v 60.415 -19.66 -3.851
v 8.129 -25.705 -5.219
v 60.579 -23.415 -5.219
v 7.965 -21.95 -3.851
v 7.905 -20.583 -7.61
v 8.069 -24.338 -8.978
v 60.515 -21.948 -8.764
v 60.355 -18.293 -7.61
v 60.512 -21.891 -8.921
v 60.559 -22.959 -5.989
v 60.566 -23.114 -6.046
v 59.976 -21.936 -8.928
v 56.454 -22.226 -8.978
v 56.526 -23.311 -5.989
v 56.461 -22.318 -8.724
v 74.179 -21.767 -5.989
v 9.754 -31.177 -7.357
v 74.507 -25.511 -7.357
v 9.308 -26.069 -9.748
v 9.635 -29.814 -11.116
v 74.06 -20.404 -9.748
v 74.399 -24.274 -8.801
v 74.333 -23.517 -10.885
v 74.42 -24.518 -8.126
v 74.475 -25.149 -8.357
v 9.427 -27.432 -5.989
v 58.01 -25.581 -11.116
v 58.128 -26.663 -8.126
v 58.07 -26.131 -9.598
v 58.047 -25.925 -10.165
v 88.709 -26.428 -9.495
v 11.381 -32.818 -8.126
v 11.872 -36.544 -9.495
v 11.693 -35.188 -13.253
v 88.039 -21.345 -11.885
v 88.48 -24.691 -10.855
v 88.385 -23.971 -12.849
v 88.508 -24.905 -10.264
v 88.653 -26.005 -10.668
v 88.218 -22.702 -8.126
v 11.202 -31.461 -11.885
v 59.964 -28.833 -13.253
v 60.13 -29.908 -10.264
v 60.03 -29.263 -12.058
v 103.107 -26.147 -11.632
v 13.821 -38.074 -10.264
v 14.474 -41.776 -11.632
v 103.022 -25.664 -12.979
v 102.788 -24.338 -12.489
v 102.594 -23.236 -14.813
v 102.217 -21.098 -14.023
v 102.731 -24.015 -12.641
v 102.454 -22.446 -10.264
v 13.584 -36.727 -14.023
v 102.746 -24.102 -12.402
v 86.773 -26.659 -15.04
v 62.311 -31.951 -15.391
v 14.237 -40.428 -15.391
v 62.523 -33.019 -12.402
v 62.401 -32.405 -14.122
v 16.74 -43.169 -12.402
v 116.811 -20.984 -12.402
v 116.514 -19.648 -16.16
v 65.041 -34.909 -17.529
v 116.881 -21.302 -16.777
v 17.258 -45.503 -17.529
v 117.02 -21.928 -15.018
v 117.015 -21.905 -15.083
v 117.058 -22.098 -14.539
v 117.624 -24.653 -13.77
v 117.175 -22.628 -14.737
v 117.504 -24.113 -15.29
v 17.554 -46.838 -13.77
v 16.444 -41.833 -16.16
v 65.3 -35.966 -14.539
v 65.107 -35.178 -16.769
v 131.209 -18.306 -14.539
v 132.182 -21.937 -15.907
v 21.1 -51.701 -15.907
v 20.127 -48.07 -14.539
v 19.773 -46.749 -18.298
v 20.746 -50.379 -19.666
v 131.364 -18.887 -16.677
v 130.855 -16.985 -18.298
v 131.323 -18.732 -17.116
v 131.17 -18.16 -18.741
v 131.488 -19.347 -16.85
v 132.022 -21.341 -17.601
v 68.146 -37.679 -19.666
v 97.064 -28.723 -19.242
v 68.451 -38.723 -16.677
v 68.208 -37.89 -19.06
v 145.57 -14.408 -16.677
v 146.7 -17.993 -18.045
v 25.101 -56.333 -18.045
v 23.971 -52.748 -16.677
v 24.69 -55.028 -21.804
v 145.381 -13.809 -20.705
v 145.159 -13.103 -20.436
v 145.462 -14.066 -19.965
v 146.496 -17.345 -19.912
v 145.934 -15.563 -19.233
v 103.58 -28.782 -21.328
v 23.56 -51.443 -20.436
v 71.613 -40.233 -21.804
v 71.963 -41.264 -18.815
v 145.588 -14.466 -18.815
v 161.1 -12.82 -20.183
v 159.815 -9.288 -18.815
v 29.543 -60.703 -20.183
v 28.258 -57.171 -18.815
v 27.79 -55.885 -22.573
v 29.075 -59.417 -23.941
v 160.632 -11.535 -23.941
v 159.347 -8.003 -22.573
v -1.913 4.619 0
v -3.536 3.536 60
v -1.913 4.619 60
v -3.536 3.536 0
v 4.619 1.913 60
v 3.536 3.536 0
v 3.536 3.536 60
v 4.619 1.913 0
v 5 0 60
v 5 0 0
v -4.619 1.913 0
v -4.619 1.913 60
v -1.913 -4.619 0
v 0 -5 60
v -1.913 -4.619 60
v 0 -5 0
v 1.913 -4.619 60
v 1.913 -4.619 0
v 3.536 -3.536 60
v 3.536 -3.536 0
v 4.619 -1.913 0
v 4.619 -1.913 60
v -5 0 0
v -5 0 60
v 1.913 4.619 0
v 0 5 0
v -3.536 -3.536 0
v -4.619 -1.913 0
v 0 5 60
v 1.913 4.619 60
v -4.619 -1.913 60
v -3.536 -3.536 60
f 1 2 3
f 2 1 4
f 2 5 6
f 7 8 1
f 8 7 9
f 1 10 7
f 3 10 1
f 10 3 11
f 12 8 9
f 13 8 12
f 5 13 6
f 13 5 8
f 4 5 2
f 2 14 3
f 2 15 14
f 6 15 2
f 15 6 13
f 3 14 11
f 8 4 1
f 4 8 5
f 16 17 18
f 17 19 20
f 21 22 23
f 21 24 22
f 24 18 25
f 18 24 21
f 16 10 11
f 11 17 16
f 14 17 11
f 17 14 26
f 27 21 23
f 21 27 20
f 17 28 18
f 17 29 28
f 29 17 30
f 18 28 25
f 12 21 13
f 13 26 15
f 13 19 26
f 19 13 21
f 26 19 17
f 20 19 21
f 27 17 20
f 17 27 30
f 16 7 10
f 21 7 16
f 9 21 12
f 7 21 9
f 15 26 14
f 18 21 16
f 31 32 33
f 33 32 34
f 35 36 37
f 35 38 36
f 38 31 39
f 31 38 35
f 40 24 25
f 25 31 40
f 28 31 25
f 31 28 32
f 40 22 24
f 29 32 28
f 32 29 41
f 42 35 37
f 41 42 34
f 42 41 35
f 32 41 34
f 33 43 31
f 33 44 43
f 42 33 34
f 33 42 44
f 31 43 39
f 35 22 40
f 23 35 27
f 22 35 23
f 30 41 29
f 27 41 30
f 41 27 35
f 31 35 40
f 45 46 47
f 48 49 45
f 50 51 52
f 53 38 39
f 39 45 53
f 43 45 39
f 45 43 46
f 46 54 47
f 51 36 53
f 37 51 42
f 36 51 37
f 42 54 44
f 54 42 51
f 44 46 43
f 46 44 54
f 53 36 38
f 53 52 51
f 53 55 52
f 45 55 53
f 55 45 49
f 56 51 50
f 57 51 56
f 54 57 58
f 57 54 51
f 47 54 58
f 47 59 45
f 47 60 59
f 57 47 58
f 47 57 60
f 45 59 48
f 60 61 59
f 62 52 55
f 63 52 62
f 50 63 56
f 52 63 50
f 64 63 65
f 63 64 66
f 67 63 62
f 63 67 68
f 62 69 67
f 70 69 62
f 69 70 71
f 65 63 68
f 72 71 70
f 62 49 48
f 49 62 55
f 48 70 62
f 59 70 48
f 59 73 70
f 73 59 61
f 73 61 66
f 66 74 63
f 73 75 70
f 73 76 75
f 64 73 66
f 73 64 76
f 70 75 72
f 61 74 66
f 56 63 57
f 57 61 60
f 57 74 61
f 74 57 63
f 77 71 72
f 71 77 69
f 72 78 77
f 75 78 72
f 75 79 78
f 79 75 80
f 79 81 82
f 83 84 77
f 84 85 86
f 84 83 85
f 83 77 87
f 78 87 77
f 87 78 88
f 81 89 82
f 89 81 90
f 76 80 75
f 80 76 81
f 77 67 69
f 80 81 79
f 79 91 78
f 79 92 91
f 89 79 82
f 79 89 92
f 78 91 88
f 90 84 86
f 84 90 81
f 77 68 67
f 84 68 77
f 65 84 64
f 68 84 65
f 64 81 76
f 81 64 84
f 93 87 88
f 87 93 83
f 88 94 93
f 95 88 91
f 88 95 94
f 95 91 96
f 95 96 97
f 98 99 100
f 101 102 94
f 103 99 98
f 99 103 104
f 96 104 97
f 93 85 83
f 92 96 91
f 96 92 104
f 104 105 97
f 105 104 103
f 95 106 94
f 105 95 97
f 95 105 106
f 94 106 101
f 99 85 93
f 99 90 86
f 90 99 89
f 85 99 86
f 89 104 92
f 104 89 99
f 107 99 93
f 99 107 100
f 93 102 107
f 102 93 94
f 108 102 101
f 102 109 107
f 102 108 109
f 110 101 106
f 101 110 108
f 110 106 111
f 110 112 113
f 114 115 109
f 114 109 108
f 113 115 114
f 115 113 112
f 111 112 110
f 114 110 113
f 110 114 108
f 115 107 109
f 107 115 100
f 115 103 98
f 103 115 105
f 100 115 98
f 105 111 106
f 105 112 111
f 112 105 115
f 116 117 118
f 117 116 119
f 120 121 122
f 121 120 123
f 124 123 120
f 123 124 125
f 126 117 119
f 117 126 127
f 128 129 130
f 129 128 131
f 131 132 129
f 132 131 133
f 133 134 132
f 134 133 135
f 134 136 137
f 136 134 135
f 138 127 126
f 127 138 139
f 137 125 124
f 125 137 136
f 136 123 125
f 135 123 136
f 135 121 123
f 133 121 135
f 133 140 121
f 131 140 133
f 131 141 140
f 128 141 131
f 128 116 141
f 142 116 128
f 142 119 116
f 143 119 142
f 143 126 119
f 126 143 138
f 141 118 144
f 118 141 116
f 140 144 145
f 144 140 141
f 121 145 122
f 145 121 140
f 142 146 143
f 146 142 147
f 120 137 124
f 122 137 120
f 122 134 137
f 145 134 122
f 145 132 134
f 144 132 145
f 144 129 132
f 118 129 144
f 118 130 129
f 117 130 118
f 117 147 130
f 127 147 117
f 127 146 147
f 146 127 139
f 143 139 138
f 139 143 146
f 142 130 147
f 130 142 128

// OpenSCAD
// Generated by CadMonkey
// Prompt: hey cadmonkey, create me a tree
// Generated at: 2025-11-10 16:48:16

// Tree parameters
tree_height = 100;
trunk_radius = 5;
branch_angle = 20;
num_branches = 8;
branch_length_factor = 0.7;

module trunk(height, radius) {
    cylinder(h=height, r=radius, center=false);
}

module branch(length, angle, thickness) {
    rotate([angle, 0, 0])
        translate([thickness/2, -length/2, 0])
            cube([length, thickness, thickness]);
}

module tree() {
    // Trunk
    trunk(tree_height * 0.6, trunk_radius);

    // Branches
    for (i = [1:num_branches]) {
        branch_length = tree_height * 0.4 + i * tree_height / num_branches;
        branch_angle_offset = branch_angle * i / num_branches;

        rotate([0, 0, branch_angle_offset])
            translate([trunk_radius, 0, 0])
                branch(branch_length, branch_angle, trunk_radius * 0.8);
    }
}


tree();
